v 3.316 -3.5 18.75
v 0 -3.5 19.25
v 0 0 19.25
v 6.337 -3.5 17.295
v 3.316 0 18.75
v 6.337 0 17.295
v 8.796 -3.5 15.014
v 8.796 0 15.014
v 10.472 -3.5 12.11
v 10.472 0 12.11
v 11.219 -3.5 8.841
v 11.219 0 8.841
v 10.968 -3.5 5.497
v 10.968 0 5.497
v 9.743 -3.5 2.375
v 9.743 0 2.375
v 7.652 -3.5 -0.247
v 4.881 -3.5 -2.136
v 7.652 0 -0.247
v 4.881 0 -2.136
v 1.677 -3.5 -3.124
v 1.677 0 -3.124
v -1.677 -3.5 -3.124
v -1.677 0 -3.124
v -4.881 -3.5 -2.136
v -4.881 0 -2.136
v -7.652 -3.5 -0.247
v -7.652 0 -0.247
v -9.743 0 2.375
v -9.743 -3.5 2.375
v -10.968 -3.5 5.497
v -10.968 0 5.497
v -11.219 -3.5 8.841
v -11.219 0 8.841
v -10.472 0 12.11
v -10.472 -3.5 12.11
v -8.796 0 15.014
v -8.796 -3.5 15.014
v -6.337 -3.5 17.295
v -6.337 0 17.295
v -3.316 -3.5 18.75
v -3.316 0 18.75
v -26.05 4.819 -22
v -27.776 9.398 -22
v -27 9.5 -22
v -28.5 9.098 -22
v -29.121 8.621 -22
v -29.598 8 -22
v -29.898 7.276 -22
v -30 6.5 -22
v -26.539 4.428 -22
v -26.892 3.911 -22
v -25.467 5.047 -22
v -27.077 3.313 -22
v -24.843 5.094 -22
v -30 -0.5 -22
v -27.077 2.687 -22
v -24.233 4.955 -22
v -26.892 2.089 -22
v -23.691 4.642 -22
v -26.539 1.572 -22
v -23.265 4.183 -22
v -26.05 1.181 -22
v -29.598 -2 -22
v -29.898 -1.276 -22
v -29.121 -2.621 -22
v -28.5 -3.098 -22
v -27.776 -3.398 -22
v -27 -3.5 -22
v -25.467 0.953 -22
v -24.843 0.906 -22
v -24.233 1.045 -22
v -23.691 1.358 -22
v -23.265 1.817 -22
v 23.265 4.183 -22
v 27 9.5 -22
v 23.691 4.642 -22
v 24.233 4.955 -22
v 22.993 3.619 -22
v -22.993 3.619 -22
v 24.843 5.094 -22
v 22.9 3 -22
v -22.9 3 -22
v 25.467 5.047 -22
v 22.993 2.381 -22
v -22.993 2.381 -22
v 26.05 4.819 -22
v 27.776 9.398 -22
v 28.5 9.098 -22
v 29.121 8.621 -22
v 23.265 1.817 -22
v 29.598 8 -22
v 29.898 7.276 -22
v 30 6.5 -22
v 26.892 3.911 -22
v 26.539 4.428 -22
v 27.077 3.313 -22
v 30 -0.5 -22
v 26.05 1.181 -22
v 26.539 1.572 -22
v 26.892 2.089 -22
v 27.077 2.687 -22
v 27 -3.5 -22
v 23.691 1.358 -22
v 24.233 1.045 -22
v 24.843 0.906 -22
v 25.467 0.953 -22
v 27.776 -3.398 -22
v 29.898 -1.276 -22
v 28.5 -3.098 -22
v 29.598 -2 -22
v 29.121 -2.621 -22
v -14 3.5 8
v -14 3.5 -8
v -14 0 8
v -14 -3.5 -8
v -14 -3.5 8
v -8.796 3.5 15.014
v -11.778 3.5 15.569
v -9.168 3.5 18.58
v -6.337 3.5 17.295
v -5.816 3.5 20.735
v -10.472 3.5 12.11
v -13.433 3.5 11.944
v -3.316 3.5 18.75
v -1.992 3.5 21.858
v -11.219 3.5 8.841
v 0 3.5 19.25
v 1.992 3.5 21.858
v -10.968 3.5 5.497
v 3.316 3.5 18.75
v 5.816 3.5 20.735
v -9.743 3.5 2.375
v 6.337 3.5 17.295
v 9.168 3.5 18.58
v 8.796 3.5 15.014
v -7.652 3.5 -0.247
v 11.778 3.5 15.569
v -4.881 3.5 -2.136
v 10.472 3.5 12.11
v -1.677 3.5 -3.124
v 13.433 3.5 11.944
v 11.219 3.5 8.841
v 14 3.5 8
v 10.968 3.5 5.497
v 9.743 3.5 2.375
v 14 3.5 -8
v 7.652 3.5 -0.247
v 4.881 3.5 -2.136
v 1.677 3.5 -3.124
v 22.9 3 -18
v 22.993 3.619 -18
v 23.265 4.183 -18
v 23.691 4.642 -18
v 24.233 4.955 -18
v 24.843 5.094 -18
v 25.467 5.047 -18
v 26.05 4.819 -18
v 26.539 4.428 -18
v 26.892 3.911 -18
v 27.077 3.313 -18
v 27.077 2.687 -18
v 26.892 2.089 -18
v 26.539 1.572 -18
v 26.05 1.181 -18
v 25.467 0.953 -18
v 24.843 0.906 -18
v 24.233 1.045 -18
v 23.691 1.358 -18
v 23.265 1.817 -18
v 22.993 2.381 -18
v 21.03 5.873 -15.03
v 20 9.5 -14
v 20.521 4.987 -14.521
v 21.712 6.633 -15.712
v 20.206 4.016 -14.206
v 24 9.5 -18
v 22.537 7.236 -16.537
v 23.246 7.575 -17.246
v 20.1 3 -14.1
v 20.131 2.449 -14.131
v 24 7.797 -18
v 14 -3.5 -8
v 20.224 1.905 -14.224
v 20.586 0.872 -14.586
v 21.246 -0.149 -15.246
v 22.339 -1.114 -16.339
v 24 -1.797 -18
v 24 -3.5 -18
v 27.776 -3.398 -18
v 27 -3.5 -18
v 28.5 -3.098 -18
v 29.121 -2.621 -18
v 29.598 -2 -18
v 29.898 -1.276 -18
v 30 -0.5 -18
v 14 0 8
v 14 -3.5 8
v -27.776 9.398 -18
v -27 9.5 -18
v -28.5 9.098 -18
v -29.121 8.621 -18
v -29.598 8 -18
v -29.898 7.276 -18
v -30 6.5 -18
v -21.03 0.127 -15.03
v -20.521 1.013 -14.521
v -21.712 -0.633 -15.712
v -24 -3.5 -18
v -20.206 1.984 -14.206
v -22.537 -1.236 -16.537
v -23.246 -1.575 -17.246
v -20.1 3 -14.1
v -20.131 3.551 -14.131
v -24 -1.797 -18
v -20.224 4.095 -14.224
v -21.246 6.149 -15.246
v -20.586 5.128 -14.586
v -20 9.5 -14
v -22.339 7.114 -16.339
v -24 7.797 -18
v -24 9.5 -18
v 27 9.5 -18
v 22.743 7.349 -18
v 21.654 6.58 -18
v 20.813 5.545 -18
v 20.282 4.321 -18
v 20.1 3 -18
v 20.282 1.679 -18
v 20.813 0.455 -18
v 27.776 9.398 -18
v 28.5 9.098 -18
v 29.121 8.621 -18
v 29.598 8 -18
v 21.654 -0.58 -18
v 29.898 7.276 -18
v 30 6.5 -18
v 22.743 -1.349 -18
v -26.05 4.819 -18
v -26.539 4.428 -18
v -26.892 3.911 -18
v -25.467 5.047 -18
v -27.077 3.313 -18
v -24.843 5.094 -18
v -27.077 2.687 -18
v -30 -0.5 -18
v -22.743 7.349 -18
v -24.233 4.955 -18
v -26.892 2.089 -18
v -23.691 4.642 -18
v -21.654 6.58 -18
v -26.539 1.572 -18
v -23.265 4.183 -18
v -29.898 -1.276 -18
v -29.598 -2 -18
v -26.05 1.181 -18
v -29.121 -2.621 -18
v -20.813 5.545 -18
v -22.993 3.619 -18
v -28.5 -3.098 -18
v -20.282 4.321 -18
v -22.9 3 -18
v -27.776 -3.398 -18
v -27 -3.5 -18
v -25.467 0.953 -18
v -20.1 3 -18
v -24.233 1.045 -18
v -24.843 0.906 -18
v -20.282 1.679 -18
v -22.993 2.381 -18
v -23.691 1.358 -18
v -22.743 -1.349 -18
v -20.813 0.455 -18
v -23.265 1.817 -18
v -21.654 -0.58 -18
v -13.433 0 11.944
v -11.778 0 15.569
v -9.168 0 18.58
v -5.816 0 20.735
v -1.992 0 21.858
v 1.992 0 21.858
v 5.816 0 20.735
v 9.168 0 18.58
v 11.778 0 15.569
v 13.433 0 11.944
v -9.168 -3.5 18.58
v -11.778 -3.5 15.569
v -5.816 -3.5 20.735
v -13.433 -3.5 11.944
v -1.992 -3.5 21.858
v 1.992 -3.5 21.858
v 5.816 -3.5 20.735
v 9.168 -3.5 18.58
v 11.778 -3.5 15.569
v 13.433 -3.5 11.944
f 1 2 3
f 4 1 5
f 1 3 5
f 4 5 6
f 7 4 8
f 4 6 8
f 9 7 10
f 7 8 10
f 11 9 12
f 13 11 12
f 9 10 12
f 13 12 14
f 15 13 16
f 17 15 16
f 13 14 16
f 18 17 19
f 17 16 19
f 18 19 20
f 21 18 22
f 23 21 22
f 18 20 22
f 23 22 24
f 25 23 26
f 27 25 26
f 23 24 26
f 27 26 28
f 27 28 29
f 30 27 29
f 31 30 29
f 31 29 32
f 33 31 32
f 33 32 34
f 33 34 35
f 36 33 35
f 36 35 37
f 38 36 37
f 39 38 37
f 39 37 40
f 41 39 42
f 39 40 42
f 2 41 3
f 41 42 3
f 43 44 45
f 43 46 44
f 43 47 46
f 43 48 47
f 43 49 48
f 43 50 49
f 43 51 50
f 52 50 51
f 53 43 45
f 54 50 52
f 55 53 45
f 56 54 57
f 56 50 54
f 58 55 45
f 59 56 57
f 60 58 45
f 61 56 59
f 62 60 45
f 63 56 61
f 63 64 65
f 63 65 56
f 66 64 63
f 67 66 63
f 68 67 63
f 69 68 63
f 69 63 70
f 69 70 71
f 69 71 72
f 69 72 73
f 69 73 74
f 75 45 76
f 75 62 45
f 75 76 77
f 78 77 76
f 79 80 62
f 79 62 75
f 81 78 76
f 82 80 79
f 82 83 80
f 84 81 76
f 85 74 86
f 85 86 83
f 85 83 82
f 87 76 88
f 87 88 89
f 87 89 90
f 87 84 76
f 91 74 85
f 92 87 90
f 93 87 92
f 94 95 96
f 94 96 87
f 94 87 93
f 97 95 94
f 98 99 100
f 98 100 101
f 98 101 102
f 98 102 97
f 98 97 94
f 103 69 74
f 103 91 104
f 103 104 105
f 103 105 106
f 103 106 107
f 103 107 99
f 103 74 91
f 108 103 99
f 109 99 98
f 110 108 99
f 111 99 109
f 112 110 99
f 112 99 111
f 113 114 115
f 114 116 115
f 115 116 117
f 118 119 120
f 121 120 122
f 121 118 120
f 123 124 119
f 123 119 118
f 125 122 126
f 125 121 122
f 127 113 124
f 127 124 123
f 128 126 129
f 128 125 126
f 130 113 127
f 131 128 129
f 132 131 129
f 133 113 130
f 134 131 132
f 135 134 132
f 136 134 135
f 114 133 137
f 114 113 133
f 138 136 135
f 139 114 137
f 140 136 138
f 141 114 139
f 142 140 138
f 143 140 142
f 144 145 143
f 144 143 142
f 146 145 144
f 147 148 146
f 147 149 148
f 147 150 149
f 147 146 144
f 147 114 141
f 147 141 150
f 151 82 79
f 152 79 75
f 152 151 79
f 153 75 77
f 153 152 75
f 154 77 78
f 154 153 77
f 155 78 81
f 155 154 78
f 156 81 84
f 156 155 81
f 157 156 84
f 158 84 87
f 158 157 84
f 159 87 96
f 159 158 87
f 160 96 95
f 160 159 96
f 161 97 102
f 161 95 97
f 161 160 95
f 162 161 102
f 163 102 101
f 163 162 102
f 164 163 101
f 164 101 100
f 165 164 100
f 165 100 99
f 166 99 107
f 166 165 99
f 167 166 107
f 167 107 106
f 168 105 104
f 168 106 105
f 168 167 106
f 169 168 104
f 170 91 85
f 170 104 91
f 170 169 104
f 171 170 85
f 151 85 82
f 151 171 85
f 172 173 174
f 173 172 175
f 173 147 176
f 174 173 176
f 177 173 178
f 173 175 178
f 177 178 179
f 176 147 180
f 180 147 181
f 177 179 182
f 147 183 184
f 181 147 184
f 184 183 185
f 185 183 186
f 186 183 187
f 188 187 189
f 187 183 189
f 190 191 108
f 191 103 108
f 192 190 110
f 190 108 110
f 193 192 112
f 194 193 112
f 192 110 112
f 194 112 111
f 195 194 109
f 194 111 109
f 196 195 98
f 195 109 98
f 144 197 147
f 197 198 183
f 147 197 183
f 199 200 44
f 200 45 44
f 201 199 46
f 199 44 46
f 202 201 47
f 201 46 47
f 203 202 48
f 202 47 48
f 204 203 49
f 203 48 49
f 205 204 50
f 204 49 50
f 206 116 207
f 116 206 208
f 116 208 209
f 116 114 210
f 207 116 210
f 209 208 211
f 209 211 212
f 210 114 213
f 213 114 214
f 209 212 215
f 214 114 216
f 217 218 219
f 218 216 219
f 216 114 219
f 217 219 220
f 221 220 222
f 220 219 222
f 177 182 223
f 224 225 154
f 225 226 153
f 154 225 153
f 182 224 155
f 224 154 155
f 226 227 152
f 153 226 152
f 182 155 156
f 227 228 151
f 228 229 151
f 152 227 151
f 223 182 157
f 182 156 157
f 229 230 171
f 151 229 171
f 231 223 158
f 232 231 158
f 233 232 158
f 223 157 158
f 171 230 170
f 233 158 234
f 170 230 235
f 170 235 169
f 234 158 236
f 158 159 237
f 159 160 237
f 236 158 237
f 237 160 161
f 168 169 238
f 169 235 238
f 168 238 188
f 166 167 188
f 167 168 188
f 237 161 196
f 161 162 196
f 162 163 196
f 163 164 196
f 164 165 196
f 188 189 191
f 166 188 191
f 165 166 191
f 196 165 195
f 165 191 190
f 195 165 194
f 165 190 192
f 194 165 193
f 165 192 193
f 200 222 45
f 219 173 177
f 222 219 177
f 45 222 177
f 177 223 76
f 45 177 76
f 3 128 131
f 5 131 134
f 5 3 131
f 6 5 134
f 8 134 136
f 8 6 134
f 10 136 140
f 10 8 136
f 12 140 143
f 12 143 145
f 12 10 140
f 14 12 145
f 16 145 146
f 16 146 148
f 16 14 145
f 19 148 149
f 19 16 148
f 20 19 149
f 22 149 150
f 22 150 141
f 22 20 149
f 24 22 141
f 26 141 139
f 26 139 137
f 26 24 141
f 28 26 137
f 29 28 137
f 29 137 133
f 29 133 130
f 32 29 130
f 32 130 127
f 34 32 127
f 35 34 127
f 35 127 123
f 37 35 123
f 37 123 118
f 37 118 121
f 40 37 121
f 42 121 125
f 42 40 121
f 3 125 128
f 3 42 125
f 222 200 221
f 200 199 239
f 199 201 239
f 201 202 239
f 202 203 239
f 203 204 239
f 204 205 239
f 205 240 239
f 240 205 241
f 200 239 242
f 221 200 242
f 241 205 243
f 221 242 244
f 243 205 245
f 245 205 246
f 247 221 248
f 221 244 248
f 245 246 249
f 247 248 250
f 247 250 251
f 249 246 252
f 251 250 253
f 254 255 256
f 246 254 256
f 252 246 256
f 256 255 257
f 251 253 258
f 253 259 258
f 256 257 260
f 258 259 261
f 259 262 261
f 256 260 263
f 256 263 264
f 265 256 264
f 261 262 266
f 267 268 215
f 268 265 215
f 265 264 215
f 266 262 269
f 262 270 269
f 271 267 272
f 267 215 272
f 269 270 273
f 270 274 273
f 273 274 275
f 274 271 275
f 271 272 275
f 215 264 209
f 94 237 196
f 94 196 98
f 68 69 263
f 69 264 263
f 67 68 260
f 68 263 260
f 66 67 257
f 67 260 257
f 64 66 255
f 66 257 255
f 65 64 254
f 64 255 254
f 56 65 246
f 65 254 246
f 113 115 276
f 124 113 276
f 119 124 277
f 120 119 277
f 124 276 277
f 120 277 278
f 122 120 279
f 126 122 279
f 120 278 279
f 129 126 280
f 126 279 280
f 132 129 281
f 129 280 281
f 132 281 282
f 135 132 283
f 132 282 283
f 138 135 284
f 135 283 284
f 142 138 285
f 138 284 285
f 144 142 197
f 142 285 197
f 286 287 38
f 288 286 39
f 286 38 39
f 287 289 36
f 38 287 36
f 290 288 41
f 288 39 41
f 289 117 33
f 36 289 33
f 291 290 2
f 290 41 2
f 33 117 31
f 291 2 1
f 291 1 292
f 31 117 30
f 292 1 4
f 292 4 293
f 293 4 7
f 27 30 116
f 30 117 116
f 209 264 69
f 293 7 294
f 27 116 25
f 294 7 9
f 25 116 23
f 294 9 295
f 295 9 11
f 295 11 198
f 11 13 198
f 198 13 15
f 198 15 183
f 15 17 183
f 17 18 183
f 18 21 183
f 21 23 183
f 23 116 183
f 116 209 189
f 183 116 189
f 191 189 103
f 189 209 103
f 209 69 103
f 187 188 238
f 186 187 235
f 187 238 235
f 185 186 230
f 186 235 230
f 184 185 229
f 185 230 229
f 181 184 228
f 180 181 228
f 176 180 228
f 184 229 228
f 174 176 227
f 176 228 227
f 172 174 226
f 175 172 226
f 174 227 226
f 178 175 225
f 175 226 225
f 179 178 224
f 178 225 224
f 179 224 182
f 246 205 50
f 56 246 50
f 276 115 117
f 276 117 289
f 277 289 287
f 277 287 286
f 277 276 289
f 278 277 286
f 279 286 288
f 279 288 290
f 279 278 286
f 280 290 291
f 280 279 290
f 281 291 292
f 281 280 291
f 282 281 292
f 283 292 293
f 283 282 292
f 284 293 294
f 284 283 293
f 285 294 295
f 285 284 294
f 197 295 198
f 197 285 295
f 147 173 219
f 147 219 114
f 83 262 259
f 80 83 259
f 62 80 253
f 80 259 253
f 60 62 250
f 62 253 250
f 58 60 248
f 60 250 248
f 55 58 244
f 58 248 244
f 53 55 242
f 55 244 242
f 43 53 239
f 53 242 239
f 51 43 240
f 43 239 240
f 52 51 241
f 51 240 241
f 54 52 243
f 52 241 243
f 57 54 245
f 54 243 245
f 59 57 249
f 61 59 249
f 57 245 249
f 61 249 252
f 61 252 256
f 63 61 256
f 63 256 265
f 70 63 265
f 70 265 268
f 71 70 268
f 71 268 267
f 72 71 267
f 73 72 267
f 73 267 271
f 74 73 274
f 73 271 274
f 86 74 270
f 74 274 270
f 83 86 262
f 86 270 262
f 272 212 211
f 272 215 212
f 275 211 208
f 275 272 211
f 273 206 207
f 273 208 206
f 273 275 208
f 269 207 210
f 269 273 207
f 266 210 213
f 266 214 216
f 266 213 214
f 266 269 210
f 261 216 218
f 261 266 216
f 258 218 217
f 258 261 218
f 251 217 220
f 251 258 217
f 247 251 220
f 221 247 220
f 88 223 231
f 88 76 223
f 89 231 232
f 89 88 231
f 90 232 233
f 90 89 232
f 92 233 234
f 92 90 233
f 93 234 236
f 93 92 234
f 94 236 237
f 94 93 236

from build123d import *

# Parameters (mm, degrees)
ESBO_O1_R                = 14
ESBO_O1_R_2              = 11.25
RESSALTO_EXTRUS_O1_DEPTH = 3.5
ESBO_O2_W                = 60
ESBO_O2_H                = 4
RESSALTO_EXTRUS_O2_DEPTH = 6
CHANFRO3_SIZE            = 10
CHANFRO5_SIZE            = 10
ESBO_O6_R                = 2.1
CORTE_EXTRUS_O2_DEPTH    = 51.89449872
ESBO_O7_R                = 4.9
CORTE_EXTRUS_O6_DEPTH    = 51.89449872
FILETE1_R                = 3


with BuildPart() as part:
    # Esboço1 → Ressalto-extrusão1 (new, symmetric)
    # profile 1 of 3: a face of its own
    with BuildSketch(Plane(origin=(0, 0, 0), x_dir=(1, 0, 0), z_dir=(0, 1, 0))):
        Polygon((30, 22), (-30, 22), (-30, 18), (-14, 18), (14, 18), (30, 18), align=None)
    # profile 2 of 3: a face of its own
    with BuildSketch(Plane(origin=(0, 0, 0), x_dir=(1, 0, 0), z_dir=(0, 1, 0))):
        with BuildLine():
            Line((14, 18), (-14, 18))
            Line((-14, 18), (-14, -8))
            ThreePointArc((-14, -8), (0, 6), (14, -8))
            Line((14, -8), (14, 18))
        make_face()
    # profile 3 of 3: a face of its own
    with BuildSketch(Plane(origin=(0, 0, 0), x_dir=(1, 0, 0), z_dir=(0, 1, 0))):
        with Locations((0, -8)):
            Circle(ESBO_O1_R)
        with Locations(Location((0, -8, 0), (0, 0, 270))):
            Circle(ESBO_O1_R_2, mode=Mode.SUBTRACT)
    extrude(amount=RESSALTO_EXTRUS_O1_DEPTH, both=True)

    # Esboço2 → Ressalto-extrusão2 (add)
    with BuildSketch(Plane(origin=(0, 3.5, 0), x_dir=(1, 0, 0), z_dir=(0, 1, 0))):
        with Locations((0, 20)):
            Rectangle(ESBO_O2_W, ESBO_O2_H)
    extrude(amount=RESSALTO_EXTRUS_O2_DEPTH)

    # Chanfro3
    chanfro3_edges = [part.edges().sort_by_distance(p)[0] for p in [
        (14, 0, -18),
        (-14, 0, -18),
    ]]
    chamfer(chanfro3_edges, length=CHANFRO3_SIZE)

    # Chanfro5
    # the kernel refuses this chamfer: 10 mm, written as the material it adds along each edge
    with BuildSketch(Plane(origin=(-49.71682988, 3.5, -18), x_dir=(0, 0.9996219169112968, -0.027495876610586317), z_dir=(1, 0, 0))) as chanfro5_piece_1_section:
        Polygon((CHANFRO5_SIZE * 0.999621916911, CHANFRO5_SIZE * 0.0274958766106), (-CHANFRO5_SIZE * 0.0274958766106, CHANFRO5_SIZE * 0.999621916911), (0, 0), align=None)
    chanfro5_piece_1 = extrude(amount=99.433659759, mode=Mode.PRIVATE)
    chanfro5_piece_1 = split(chanfro5_piece_1, bisect_by=Plane(origin=(-17.624703453, 9.5, -15.249406907), z_dir=(0, -1, 0)), keep=Keep.TOP, mode=Mode.PRIVATE)
    chanfro5_piece_1 = split(chanfro5_piece_1, bisect_by=Plane(origin=(-19.43705518, 6.203831668, -13.43705518), z_dir=(0.7071067811865475, 0, -0.7071067811865477)), keep=Keep.TOP, mode=Mode.PRIVATE)
    chanfro5_piece_1 = split(chanfro5_piece_1, bisect_by=Plane(origin=(-14, 6.203831668, -15.249406907), z_dir=(-1, 0, 0)), keep=Keep.TOP, mode=Mode.PRIVATE)
    add(chanfro5_piece_1)
    with BuildSketch(Plane(origin=(-49.71682988, 3.5, -18), x_dir=(0, 0.9996219169112968, -0.027495876610586317), z_dir=(1, 0, 0))) as chanfro5_piece_2_section:
        Polygon((CHANFRO5_SIZE * 0.999621916911, CHANFRO5_SIZE * 0.0274958766106), (-CHANFRO5_SIZE * 0.0274958766106, CHANFRO5_SIZE * 0.999621916911), (0, 0), align=None)
    chanfro5_piece_2 = extrude(amount=99.433659759, mode=Mode.PRIVATE)
    chanfro5_piece_2 = split(chanfro5_piece_2, bisect_by=Plane(origin=(0, 9.5, -14.250020725), z_dir=(0, -1, 0)), keep=Keep.TOP, mode=Mode.PRIVATE)
    chanfro5_piece_2 = split(chanfro5_piece_2, bisect_by=Plane(origin=(10.125010362, 5.933615653, -4.125010362), z_dir=(-0.7071067811865479, 0, -0.7071067811865474)), keep=Keep.TOP, mode=Mode.PRIVATE)
    chanfro5_piece_2 = split(chanfro5_piece_2, bisect_by=Plane(origin=(14, 5.933615653, -14.250020725), z_dir=(-1, 0, 0)), keep=Keep.TOP, mode=Mode.PRIVATE)
    chanfro5_piece_2 = split(chanfro5_piece_2, bisect_by=Plane(origin=(-14, 5.933615653, -14.250020725), z_dir=(1, 0, 0)), keep=Keep.TOP, mode=Mode.PRIVATE)
    add(chanfro5_piece_2)
    with BuildSketch(Plane(origin=(-49.71682988, 3.5, -18), x_dir=(0, 0.9996219169112968, -0.027495876610586317), z_dir=(1, 0, 0))) as chanfro5_piece_3_section:
        Polygon((CHANFRO5_SIZE * 0.999621916911, CHANFRO5_SIZE * 0.0274958766106), (-CHANFRO5_SIZE * 0.0274958766106, CHANFRO5_SIZE * 0.999621916911), (0, 0), align=None)
    chanfro5_piece_3 = extrude(amount=99.433659759, mode=Mode.PRIVATE)
    chanfro5_piece_3 = split(chanfro5_piece_3, bisect_by=Plane(origin=(17.624703453, 9.5, -15.249406907), z_dir=(0, -1, 0)), keep=Keep.TOP, mode=Mode.PRIVATE)
    chanfro5_piece_3 = split(chanfro5_piece_3, bisect_by=Plane(origin=(19.43705518, 6.203831668, -13.43705518), z_dir=(-0.7071067811865479, 0, -0.7071067811865474)), keep=Keep.TOP, mode=Mode.PRIVATE)
    chanfro5_piece_3 = split(chanfro5_piece_3, bisect_by=Plane(origin=(14, 6.203831668, -15.249406907), z_dir=(1, 0, 0)), keep=Keep.TOP, mode=Mode.PRIVATE)
    add(chanfro5_piece_3)

    # Esboço6 → Corte-extrusão2 (cut, symmetric)
    with BuildSketch(Plane.XY.offset(-18)):
        with Locations((-25, 3)):
            Circle(ESBO_O6_R)
    corte_extrus_o2 = extrude(amount=CORTE_EXTRUS_O2_DEPTH, both=True, mode=Mode.SUBTRACT)

    # Esboço7 → Corte-extrusão6 (cut, through all)
    with BuildSketch(Plane.XY.offset(-18)):
        with Locations((-25, 3)):
            Circle(ESBO_O7_R)
    corte_extrus_o6 = extrude(amount=CORTE_EXTRUS_O6_DEPTH, mode=Mode.SUBTRACT)

    # Espelhar2: Corte-extrusão2, Corte-extrusão6 across plane
    add(corte_extrus_o2.mirror(Plane(origin=(0, 0, 0), x_dir=(0, 0, 1), z_dir=(1, 0, 0))), mode=Mode.SUBTRACT)
    add(corte_extrus_o6.mirror(Plane(origin=(0, 0, 0), x_dir=(0, 0, 1), z_dir=(1, 0, 0))), mode=Mode.SUBTRACT)

    # Filete1
    filete1_edges = [part.edges().sort_by_distance(p)[0] for p in [
        (30, -3.5, -20),
        (-30, -3.5, -20),
        (-30, 9.5, -20),
        (30, 9.5, -20),
    ]]
    fillet(filete1_edges, radius=FILETE1_R)


solid = part.part
